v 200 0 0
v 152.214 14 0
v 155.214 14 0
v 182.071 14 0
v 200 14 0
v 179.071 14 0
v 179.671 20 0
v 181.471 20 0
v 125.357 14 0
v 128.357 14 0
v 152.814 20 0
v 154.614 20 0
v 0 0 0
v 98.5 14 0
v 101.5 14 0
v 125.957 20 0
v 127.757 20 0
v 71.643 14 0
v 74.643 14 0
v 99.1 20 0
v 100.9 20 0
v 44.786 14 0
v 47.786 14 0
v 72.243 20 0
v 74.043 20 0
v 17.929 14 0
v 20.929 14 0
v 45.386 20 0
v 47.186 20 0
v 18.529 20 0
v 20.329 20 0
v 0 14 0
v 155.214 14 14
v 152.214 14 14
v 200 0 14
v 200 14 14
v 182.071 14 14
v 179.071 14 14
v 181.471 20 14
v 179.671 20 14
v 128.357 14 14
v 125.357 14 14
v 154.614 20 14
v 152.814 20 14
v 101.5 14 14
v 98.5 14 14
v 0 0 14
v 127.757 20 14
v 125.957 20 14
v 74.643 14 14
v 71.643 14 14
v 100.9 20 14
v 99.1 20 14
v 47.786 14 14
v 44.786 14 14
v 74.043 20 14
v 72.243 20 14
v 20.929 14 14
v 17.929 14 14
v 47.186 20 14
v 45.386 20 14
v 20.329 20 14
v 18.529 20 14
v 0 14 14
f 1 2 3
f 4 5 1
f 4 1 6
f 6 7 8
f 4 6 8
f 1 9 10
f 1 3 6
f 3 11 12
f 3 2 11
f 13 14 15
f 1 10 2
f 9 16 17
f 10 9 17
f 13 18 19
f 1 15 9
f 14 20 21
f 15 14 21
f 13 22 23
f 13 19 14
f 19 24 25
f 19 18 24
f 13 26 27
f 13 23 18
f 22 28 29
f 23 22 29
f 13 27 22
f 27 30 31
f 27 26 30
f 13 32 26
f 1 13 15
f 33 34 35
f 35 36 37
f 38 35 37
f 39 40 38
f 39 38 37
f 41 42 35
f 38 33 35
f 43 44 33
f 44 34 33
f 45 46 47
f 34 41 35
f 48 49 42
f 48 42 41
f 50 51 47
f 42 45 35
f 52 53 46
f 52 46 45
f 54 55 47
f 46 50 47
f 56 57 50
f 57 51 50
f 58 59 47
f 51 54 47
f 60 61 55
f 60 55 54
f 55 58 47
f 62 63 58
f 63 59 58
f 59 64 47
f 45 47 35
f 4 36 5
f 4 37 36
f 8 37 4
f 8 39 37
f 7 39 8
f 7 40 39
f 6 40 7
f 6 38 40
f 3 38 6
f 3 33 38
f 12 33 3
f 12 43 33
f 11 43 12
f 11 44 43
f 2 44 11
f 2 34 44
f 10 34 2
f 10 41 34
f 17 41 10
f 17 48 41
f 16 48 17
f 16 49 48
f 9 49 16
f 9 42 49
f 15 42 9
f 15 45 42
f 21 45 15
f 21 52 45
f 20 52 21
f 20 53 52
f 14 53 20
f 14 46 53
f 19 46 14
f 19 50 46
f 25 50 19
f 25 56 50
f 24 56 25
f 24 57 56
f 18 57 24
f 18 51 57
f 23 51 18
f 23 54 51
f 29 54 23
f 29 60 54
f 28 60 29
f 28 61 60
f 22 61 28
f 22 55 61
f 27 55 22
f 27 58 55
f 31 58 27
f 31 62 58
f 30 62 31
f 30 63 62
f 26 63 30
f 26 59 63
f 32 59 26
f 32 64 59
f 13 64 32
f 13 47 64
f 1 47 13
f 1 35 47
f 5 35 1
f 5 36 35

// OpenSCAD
$fn = 32;

// ----------------------------------------------------------------------
// Gear rack: 7 teeth on a 200 mm bar, pitch 26.86 mm
// ----------------------------------------------------------------------

// --- parameters (mm) ---
profile_height = 14;      // extrusion height
profile_points = 32;      // points of the closed outline

profile = [[0, 0], [200, 0], [200, 14], [182.071, 14], [181.471, 20], [179.671, 20], [179.071, 14], [155.214, 14], [154.614, 20], [152.814, 20], [152.214, 14], [128.357, 14], [127.757, 20], [125.957, 20], [125.357, 14], [101.5, 14], [100.9, 20], [99.1, 20], [98.5, 14], [74.643, 14], [74.043, 20], [72.243, 20], [71.643, 14], [47.786, 14], [47.186, 20], [45.386, 20], [44.786, 14], [20.929, 14], [20.329, 20], [18.529, 20], [17.929, 14], [0, 14]];  // single closed polygon, 32 points, counter clockwise

// --- the one profile operation ---
linear_extrude(height = profile_height) polygon(points = profile);
